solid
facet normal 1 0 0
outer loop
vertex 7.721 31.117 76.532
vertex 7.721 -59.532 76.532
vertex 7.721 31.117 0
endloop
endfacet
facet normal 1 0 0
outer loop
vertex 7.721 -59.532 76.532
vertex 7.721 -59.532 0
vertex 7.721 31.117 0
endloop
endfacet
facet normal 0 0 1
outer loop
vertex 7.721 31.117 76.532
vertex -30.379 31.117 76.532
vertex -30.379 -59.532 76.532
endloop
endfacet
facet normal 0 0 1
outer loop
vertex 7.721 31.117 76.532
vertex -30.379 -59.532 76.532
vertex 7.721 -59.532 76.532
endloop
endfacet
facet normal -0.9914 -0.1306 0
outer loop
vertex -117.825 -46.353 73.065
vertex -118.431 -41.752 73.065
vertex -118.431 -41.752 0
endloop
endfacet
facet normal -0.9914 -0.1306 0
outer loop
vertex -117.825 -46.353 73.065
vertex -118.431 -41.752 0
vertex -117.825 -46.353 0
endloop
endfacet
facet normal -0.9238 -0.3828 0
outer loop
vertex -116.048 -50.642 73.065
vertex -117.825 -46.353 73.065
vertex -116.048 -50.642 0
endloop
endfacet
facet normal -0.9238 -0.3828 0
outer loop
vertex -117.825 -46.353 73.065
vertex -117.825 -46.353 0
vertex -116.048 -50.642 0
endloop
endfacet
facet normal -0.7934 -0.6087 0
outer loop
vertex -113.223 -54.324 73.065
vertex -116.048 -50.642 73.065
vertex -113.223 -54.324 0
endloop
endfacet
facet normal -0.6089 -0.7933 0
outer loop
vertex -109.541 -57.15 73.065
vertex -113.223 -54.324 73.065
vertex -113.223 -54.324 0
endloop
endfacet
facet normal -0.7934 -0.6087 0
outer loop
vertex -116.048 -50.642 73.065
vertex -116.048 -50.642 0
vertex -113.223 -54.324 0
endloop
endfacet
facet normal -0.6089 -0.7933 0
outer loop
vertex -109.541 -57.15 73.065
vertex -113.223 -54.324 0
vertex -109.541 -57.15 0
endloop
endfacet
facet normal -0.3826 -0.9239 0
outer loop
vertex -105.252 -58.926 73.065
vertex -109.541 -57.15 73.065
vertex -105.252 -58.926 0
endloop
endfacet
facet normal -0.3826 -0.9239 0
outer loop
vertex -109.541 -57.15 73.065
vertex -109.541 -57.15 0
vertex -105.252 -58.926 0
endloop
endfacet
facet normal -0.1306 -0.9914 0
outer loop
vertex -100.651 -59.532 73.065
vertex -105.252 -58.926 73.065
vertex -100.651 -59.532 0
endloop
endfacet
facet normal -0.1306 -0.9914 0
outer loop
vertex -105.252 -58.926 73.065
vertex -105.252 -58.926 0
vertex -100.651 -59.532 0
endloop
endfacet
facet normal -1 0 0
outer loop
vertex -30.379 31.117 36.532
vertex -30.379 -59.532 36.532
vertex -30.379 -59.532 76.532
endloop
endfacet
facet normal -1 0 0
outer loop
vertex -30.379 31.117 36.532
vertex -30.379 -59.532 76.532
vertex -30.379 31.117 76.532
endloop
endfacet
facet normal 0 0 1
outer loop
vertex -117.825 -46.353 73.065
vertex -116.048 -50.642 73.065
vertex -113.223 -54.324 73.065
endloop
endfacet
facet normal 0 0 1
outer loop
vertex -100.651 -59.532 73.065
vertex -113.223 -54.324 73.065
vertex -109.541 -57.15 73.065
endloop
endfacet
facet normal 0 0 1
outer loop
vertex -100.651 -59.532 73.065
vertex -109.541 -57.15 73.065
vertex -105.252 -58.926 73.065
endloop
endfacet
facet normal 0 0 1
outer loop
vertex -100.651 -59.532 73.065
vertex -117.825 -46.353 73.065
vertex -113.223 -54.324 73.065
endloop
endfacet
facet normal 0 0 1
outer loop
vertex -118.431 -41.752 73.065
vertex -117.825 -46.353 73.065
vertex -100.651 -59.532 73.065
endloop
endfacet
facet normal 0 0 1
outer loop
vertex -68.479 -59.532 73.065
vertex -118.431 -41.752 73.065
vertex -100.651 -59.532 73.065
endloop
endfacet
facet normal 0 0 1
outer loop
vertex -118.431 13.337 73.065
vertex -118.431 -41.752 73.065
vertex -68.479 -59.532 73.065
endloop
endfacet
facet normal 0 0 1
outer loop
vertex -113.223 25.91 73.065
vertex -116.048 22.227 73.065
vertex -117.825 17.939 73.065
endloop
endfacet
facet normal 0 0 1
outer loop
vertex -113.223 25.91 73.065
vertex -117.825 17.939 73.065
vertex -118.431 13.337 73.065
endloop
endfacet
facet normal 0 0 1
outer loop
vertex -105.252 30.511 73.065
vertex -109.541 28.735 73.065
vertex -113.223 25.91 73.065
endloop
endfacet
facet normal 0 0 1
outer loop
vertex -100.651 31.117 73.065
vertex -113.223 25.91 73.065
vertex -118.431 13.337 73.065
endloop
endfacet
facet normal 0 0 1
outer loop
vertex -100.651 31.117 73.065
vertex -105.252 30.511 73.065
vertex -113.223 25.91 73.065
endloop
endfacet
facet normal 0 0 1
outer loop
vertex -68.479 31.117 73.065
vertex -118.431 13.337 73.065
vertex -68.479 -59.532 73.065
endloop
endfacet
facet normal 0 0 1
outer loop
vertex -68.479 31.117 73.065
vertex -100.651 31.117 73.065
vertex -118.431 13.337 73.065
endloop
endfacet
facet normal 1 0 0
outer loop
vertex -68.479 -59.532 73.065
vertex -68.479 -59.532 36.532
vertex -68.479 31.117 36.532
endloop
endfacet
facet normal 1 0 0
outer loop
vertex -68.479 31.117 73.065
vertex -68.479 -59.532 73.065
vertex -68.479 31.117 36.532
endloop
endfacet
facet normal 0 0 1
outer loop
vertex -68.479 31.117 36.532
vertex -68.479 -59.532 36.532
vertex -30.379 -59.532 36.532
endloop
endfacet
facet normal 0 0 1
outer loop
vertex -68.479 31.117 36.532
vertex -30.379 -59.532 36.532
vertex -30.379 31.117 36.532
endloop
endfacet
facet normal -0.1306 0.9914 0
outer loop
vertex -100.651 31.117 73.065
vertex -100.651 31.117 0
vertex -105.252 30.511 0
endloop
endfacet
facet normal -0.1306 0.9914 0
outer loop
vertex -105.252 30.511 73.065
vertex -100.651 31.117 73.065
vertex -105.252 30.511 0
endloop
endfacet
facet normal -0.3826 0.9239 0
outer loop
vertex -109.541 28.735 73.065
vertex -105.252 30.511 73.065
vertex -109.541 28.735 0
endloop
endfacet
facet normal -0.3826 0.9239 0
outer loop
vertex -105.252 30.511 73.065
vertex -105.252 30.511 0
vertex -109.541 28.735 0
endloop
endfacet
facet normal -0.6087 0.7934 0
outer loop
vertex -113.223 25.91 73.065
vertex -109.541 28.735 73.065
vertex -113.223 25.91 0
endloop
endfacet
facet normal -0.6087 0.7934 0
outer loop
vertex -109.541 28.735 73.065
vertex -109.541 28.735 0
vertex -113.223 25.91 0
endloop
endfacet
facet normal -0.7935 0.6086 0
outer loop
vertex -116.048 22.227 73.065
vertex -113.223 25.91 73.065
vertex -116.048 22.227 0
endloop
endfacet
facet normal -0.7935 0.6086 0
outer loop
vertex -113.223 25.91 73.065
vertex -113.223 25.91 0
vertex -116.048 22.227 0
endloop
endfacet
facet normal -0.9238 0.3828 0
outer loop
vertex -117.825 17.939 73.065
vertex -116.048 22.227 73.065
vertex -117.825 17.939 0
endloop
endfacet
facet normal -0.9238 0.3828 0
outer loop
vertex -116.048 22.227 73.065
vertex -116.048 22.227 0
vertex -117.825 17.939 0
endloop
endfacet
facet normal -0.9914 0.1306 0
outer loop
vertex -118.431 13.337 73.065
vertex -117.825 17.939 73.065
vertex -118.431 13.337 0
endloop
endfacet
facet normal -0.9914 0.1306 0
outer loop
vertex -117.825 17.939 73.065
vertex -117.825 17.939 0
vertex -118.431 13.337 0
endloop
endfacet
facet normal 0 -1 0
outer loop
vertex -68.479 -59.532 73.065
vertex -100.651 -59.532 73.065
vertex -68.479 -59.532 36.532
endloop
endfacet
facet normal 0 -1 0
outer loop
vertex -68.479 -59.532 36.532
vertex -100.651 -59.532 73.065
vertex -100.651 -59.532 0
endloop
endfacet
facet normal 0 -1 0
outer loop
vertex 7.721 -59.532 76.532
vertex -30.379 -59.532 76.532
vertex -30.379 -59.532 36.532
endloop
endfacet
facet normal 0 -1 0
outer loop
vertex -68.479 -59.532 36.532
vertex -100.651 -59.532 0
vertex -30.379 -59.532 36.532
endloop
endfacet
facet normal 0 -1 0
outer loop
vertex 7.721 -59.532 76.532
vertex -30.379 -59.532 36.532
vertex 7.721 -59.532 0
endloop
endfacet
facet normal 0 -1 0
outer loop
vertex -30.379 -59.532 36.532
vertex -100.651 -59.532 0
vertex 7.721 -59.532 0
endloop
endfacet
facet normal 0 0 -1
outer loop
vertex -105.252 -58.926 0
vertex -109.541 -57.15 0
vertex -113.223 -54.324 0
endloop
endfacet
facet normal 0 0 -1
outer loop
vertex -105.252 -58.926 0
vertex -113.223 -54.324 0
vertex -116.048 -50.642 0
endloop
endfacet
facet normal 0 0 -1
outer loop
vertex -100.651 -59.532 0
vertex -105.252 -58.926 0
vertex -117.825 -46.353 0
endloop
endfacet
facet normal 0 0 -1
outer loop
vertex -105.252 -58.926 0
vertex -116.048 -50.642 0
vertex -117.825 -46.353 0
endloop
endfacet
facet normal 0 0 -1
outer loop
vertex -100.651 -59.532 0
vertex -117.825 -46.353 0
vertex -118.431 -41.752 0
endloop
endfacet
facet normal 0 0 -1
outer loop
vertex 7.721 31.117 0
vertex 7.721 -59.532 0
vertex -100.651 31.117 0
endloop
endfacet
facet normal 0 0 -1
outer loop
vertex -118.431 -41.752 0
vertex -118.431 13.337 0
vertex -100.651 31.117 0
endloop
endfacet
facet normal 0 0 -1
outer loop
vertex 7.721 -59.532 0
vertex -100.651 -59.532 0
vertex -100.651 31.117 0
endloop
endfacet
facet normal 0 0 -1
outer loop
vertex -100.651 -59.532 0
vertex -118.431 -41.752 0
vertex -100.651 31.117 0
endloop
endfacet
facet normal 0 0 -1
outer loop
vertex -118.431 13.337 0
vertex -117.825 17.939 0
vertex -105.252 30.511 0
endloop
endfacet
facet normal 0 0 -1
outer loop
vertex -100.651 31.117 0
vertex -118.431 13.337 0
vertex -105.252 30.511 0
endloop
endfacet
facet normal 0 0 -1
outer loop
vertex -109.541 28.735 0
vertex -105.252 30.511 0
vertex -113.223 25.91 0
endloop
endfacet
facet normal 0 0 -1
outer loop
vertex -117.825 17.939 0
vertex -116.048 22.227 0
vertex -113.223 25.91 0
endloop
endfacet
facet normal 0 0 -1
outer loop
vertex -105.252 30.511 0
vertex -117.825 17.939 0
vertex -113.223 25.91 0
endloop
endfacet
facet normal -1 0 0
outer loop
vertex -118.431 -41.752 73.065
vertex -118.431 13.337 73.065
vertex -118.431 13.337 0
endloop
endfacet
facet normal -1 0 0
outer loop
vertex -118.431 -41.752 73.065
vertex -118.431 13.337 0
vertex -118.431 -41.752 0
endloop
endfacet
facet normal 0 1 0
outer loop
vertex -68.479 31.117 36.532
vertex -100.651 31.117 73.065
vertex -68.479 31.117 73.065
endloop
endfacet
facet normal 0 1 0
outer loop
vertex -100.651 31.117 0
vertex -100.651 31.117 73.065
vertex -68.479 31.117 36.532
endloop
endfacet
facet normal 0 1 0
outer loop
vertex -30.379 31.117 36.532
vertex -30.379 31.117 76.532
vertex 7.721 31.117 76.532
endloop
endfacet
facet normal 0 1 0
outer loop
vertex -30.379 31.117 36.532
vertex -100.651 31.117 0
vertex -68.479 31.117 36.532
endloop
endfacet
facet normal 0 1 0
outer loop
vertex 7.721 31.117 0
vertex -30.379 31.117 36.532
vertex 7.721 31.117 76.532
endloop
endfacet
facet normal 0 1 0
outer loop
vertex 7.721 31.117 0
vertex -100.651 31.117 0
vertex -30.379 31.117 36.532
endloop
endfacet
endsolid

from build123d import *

# Parameters (mm, degrees)
F1_DEPTH = 73.06463
F2_W     = 90.6488774794
F2_H     = 36.532315
F3_DEPTH = 76.2
F4_W     = 38.1
F4_H     = 90.6488774794
F5_DEPTH = 40


with BuildPart() as f1:
    # F0 (on Top) → F1 (new body)
    with BuildSketch(Plane.XY):
        with BuildLine():
            Line((-68.4786736965, 31.1171887892), (-100.6505399656, 31.1171887892))
            ThreePointArc((-100.6505399656, 31.1171887892), (-113.2228985351, 25.9095473587), (-118.4305399656, 13.3371887892))
            Line((-118.4305399656, 13.3371887892), (-118.4305399656, -41.7516886902))
            ThreePointArc((-118.4305399656, -41.7516886902), (-113.2228985351, -54.3240472597), (-100.6505399656, -59.5316886902))
            Line((-100.6505399656, -59.5316886902), (-68.4786736965, -59.5316886902))
            Line((-68.4786736965, -59.5316886902), (-68.4786736965, 31.1171887892))
        make_face()
    extrude(amount=F1_DEPTH)

    # F2 (on face) → F3 (join)
    with BuildSketch(Plane.YZ.offset(-68.4786736965)):
        with Locations((-14.2072499505, 18.2661575)):
            Rectangle(F2_W, F2_H)
    extrude(amount=F3_DEPTH)

    # F4 (on face) → F5 (join)
    with BuildSketch(Plane.XY.offset(36.532315)):
        with Locations((-11.3286736965, -14.2072499505)):
            Rectangle(F4_W, F4_H)
    extrude(amount=F5_DEPTH)


solid = f1.part
